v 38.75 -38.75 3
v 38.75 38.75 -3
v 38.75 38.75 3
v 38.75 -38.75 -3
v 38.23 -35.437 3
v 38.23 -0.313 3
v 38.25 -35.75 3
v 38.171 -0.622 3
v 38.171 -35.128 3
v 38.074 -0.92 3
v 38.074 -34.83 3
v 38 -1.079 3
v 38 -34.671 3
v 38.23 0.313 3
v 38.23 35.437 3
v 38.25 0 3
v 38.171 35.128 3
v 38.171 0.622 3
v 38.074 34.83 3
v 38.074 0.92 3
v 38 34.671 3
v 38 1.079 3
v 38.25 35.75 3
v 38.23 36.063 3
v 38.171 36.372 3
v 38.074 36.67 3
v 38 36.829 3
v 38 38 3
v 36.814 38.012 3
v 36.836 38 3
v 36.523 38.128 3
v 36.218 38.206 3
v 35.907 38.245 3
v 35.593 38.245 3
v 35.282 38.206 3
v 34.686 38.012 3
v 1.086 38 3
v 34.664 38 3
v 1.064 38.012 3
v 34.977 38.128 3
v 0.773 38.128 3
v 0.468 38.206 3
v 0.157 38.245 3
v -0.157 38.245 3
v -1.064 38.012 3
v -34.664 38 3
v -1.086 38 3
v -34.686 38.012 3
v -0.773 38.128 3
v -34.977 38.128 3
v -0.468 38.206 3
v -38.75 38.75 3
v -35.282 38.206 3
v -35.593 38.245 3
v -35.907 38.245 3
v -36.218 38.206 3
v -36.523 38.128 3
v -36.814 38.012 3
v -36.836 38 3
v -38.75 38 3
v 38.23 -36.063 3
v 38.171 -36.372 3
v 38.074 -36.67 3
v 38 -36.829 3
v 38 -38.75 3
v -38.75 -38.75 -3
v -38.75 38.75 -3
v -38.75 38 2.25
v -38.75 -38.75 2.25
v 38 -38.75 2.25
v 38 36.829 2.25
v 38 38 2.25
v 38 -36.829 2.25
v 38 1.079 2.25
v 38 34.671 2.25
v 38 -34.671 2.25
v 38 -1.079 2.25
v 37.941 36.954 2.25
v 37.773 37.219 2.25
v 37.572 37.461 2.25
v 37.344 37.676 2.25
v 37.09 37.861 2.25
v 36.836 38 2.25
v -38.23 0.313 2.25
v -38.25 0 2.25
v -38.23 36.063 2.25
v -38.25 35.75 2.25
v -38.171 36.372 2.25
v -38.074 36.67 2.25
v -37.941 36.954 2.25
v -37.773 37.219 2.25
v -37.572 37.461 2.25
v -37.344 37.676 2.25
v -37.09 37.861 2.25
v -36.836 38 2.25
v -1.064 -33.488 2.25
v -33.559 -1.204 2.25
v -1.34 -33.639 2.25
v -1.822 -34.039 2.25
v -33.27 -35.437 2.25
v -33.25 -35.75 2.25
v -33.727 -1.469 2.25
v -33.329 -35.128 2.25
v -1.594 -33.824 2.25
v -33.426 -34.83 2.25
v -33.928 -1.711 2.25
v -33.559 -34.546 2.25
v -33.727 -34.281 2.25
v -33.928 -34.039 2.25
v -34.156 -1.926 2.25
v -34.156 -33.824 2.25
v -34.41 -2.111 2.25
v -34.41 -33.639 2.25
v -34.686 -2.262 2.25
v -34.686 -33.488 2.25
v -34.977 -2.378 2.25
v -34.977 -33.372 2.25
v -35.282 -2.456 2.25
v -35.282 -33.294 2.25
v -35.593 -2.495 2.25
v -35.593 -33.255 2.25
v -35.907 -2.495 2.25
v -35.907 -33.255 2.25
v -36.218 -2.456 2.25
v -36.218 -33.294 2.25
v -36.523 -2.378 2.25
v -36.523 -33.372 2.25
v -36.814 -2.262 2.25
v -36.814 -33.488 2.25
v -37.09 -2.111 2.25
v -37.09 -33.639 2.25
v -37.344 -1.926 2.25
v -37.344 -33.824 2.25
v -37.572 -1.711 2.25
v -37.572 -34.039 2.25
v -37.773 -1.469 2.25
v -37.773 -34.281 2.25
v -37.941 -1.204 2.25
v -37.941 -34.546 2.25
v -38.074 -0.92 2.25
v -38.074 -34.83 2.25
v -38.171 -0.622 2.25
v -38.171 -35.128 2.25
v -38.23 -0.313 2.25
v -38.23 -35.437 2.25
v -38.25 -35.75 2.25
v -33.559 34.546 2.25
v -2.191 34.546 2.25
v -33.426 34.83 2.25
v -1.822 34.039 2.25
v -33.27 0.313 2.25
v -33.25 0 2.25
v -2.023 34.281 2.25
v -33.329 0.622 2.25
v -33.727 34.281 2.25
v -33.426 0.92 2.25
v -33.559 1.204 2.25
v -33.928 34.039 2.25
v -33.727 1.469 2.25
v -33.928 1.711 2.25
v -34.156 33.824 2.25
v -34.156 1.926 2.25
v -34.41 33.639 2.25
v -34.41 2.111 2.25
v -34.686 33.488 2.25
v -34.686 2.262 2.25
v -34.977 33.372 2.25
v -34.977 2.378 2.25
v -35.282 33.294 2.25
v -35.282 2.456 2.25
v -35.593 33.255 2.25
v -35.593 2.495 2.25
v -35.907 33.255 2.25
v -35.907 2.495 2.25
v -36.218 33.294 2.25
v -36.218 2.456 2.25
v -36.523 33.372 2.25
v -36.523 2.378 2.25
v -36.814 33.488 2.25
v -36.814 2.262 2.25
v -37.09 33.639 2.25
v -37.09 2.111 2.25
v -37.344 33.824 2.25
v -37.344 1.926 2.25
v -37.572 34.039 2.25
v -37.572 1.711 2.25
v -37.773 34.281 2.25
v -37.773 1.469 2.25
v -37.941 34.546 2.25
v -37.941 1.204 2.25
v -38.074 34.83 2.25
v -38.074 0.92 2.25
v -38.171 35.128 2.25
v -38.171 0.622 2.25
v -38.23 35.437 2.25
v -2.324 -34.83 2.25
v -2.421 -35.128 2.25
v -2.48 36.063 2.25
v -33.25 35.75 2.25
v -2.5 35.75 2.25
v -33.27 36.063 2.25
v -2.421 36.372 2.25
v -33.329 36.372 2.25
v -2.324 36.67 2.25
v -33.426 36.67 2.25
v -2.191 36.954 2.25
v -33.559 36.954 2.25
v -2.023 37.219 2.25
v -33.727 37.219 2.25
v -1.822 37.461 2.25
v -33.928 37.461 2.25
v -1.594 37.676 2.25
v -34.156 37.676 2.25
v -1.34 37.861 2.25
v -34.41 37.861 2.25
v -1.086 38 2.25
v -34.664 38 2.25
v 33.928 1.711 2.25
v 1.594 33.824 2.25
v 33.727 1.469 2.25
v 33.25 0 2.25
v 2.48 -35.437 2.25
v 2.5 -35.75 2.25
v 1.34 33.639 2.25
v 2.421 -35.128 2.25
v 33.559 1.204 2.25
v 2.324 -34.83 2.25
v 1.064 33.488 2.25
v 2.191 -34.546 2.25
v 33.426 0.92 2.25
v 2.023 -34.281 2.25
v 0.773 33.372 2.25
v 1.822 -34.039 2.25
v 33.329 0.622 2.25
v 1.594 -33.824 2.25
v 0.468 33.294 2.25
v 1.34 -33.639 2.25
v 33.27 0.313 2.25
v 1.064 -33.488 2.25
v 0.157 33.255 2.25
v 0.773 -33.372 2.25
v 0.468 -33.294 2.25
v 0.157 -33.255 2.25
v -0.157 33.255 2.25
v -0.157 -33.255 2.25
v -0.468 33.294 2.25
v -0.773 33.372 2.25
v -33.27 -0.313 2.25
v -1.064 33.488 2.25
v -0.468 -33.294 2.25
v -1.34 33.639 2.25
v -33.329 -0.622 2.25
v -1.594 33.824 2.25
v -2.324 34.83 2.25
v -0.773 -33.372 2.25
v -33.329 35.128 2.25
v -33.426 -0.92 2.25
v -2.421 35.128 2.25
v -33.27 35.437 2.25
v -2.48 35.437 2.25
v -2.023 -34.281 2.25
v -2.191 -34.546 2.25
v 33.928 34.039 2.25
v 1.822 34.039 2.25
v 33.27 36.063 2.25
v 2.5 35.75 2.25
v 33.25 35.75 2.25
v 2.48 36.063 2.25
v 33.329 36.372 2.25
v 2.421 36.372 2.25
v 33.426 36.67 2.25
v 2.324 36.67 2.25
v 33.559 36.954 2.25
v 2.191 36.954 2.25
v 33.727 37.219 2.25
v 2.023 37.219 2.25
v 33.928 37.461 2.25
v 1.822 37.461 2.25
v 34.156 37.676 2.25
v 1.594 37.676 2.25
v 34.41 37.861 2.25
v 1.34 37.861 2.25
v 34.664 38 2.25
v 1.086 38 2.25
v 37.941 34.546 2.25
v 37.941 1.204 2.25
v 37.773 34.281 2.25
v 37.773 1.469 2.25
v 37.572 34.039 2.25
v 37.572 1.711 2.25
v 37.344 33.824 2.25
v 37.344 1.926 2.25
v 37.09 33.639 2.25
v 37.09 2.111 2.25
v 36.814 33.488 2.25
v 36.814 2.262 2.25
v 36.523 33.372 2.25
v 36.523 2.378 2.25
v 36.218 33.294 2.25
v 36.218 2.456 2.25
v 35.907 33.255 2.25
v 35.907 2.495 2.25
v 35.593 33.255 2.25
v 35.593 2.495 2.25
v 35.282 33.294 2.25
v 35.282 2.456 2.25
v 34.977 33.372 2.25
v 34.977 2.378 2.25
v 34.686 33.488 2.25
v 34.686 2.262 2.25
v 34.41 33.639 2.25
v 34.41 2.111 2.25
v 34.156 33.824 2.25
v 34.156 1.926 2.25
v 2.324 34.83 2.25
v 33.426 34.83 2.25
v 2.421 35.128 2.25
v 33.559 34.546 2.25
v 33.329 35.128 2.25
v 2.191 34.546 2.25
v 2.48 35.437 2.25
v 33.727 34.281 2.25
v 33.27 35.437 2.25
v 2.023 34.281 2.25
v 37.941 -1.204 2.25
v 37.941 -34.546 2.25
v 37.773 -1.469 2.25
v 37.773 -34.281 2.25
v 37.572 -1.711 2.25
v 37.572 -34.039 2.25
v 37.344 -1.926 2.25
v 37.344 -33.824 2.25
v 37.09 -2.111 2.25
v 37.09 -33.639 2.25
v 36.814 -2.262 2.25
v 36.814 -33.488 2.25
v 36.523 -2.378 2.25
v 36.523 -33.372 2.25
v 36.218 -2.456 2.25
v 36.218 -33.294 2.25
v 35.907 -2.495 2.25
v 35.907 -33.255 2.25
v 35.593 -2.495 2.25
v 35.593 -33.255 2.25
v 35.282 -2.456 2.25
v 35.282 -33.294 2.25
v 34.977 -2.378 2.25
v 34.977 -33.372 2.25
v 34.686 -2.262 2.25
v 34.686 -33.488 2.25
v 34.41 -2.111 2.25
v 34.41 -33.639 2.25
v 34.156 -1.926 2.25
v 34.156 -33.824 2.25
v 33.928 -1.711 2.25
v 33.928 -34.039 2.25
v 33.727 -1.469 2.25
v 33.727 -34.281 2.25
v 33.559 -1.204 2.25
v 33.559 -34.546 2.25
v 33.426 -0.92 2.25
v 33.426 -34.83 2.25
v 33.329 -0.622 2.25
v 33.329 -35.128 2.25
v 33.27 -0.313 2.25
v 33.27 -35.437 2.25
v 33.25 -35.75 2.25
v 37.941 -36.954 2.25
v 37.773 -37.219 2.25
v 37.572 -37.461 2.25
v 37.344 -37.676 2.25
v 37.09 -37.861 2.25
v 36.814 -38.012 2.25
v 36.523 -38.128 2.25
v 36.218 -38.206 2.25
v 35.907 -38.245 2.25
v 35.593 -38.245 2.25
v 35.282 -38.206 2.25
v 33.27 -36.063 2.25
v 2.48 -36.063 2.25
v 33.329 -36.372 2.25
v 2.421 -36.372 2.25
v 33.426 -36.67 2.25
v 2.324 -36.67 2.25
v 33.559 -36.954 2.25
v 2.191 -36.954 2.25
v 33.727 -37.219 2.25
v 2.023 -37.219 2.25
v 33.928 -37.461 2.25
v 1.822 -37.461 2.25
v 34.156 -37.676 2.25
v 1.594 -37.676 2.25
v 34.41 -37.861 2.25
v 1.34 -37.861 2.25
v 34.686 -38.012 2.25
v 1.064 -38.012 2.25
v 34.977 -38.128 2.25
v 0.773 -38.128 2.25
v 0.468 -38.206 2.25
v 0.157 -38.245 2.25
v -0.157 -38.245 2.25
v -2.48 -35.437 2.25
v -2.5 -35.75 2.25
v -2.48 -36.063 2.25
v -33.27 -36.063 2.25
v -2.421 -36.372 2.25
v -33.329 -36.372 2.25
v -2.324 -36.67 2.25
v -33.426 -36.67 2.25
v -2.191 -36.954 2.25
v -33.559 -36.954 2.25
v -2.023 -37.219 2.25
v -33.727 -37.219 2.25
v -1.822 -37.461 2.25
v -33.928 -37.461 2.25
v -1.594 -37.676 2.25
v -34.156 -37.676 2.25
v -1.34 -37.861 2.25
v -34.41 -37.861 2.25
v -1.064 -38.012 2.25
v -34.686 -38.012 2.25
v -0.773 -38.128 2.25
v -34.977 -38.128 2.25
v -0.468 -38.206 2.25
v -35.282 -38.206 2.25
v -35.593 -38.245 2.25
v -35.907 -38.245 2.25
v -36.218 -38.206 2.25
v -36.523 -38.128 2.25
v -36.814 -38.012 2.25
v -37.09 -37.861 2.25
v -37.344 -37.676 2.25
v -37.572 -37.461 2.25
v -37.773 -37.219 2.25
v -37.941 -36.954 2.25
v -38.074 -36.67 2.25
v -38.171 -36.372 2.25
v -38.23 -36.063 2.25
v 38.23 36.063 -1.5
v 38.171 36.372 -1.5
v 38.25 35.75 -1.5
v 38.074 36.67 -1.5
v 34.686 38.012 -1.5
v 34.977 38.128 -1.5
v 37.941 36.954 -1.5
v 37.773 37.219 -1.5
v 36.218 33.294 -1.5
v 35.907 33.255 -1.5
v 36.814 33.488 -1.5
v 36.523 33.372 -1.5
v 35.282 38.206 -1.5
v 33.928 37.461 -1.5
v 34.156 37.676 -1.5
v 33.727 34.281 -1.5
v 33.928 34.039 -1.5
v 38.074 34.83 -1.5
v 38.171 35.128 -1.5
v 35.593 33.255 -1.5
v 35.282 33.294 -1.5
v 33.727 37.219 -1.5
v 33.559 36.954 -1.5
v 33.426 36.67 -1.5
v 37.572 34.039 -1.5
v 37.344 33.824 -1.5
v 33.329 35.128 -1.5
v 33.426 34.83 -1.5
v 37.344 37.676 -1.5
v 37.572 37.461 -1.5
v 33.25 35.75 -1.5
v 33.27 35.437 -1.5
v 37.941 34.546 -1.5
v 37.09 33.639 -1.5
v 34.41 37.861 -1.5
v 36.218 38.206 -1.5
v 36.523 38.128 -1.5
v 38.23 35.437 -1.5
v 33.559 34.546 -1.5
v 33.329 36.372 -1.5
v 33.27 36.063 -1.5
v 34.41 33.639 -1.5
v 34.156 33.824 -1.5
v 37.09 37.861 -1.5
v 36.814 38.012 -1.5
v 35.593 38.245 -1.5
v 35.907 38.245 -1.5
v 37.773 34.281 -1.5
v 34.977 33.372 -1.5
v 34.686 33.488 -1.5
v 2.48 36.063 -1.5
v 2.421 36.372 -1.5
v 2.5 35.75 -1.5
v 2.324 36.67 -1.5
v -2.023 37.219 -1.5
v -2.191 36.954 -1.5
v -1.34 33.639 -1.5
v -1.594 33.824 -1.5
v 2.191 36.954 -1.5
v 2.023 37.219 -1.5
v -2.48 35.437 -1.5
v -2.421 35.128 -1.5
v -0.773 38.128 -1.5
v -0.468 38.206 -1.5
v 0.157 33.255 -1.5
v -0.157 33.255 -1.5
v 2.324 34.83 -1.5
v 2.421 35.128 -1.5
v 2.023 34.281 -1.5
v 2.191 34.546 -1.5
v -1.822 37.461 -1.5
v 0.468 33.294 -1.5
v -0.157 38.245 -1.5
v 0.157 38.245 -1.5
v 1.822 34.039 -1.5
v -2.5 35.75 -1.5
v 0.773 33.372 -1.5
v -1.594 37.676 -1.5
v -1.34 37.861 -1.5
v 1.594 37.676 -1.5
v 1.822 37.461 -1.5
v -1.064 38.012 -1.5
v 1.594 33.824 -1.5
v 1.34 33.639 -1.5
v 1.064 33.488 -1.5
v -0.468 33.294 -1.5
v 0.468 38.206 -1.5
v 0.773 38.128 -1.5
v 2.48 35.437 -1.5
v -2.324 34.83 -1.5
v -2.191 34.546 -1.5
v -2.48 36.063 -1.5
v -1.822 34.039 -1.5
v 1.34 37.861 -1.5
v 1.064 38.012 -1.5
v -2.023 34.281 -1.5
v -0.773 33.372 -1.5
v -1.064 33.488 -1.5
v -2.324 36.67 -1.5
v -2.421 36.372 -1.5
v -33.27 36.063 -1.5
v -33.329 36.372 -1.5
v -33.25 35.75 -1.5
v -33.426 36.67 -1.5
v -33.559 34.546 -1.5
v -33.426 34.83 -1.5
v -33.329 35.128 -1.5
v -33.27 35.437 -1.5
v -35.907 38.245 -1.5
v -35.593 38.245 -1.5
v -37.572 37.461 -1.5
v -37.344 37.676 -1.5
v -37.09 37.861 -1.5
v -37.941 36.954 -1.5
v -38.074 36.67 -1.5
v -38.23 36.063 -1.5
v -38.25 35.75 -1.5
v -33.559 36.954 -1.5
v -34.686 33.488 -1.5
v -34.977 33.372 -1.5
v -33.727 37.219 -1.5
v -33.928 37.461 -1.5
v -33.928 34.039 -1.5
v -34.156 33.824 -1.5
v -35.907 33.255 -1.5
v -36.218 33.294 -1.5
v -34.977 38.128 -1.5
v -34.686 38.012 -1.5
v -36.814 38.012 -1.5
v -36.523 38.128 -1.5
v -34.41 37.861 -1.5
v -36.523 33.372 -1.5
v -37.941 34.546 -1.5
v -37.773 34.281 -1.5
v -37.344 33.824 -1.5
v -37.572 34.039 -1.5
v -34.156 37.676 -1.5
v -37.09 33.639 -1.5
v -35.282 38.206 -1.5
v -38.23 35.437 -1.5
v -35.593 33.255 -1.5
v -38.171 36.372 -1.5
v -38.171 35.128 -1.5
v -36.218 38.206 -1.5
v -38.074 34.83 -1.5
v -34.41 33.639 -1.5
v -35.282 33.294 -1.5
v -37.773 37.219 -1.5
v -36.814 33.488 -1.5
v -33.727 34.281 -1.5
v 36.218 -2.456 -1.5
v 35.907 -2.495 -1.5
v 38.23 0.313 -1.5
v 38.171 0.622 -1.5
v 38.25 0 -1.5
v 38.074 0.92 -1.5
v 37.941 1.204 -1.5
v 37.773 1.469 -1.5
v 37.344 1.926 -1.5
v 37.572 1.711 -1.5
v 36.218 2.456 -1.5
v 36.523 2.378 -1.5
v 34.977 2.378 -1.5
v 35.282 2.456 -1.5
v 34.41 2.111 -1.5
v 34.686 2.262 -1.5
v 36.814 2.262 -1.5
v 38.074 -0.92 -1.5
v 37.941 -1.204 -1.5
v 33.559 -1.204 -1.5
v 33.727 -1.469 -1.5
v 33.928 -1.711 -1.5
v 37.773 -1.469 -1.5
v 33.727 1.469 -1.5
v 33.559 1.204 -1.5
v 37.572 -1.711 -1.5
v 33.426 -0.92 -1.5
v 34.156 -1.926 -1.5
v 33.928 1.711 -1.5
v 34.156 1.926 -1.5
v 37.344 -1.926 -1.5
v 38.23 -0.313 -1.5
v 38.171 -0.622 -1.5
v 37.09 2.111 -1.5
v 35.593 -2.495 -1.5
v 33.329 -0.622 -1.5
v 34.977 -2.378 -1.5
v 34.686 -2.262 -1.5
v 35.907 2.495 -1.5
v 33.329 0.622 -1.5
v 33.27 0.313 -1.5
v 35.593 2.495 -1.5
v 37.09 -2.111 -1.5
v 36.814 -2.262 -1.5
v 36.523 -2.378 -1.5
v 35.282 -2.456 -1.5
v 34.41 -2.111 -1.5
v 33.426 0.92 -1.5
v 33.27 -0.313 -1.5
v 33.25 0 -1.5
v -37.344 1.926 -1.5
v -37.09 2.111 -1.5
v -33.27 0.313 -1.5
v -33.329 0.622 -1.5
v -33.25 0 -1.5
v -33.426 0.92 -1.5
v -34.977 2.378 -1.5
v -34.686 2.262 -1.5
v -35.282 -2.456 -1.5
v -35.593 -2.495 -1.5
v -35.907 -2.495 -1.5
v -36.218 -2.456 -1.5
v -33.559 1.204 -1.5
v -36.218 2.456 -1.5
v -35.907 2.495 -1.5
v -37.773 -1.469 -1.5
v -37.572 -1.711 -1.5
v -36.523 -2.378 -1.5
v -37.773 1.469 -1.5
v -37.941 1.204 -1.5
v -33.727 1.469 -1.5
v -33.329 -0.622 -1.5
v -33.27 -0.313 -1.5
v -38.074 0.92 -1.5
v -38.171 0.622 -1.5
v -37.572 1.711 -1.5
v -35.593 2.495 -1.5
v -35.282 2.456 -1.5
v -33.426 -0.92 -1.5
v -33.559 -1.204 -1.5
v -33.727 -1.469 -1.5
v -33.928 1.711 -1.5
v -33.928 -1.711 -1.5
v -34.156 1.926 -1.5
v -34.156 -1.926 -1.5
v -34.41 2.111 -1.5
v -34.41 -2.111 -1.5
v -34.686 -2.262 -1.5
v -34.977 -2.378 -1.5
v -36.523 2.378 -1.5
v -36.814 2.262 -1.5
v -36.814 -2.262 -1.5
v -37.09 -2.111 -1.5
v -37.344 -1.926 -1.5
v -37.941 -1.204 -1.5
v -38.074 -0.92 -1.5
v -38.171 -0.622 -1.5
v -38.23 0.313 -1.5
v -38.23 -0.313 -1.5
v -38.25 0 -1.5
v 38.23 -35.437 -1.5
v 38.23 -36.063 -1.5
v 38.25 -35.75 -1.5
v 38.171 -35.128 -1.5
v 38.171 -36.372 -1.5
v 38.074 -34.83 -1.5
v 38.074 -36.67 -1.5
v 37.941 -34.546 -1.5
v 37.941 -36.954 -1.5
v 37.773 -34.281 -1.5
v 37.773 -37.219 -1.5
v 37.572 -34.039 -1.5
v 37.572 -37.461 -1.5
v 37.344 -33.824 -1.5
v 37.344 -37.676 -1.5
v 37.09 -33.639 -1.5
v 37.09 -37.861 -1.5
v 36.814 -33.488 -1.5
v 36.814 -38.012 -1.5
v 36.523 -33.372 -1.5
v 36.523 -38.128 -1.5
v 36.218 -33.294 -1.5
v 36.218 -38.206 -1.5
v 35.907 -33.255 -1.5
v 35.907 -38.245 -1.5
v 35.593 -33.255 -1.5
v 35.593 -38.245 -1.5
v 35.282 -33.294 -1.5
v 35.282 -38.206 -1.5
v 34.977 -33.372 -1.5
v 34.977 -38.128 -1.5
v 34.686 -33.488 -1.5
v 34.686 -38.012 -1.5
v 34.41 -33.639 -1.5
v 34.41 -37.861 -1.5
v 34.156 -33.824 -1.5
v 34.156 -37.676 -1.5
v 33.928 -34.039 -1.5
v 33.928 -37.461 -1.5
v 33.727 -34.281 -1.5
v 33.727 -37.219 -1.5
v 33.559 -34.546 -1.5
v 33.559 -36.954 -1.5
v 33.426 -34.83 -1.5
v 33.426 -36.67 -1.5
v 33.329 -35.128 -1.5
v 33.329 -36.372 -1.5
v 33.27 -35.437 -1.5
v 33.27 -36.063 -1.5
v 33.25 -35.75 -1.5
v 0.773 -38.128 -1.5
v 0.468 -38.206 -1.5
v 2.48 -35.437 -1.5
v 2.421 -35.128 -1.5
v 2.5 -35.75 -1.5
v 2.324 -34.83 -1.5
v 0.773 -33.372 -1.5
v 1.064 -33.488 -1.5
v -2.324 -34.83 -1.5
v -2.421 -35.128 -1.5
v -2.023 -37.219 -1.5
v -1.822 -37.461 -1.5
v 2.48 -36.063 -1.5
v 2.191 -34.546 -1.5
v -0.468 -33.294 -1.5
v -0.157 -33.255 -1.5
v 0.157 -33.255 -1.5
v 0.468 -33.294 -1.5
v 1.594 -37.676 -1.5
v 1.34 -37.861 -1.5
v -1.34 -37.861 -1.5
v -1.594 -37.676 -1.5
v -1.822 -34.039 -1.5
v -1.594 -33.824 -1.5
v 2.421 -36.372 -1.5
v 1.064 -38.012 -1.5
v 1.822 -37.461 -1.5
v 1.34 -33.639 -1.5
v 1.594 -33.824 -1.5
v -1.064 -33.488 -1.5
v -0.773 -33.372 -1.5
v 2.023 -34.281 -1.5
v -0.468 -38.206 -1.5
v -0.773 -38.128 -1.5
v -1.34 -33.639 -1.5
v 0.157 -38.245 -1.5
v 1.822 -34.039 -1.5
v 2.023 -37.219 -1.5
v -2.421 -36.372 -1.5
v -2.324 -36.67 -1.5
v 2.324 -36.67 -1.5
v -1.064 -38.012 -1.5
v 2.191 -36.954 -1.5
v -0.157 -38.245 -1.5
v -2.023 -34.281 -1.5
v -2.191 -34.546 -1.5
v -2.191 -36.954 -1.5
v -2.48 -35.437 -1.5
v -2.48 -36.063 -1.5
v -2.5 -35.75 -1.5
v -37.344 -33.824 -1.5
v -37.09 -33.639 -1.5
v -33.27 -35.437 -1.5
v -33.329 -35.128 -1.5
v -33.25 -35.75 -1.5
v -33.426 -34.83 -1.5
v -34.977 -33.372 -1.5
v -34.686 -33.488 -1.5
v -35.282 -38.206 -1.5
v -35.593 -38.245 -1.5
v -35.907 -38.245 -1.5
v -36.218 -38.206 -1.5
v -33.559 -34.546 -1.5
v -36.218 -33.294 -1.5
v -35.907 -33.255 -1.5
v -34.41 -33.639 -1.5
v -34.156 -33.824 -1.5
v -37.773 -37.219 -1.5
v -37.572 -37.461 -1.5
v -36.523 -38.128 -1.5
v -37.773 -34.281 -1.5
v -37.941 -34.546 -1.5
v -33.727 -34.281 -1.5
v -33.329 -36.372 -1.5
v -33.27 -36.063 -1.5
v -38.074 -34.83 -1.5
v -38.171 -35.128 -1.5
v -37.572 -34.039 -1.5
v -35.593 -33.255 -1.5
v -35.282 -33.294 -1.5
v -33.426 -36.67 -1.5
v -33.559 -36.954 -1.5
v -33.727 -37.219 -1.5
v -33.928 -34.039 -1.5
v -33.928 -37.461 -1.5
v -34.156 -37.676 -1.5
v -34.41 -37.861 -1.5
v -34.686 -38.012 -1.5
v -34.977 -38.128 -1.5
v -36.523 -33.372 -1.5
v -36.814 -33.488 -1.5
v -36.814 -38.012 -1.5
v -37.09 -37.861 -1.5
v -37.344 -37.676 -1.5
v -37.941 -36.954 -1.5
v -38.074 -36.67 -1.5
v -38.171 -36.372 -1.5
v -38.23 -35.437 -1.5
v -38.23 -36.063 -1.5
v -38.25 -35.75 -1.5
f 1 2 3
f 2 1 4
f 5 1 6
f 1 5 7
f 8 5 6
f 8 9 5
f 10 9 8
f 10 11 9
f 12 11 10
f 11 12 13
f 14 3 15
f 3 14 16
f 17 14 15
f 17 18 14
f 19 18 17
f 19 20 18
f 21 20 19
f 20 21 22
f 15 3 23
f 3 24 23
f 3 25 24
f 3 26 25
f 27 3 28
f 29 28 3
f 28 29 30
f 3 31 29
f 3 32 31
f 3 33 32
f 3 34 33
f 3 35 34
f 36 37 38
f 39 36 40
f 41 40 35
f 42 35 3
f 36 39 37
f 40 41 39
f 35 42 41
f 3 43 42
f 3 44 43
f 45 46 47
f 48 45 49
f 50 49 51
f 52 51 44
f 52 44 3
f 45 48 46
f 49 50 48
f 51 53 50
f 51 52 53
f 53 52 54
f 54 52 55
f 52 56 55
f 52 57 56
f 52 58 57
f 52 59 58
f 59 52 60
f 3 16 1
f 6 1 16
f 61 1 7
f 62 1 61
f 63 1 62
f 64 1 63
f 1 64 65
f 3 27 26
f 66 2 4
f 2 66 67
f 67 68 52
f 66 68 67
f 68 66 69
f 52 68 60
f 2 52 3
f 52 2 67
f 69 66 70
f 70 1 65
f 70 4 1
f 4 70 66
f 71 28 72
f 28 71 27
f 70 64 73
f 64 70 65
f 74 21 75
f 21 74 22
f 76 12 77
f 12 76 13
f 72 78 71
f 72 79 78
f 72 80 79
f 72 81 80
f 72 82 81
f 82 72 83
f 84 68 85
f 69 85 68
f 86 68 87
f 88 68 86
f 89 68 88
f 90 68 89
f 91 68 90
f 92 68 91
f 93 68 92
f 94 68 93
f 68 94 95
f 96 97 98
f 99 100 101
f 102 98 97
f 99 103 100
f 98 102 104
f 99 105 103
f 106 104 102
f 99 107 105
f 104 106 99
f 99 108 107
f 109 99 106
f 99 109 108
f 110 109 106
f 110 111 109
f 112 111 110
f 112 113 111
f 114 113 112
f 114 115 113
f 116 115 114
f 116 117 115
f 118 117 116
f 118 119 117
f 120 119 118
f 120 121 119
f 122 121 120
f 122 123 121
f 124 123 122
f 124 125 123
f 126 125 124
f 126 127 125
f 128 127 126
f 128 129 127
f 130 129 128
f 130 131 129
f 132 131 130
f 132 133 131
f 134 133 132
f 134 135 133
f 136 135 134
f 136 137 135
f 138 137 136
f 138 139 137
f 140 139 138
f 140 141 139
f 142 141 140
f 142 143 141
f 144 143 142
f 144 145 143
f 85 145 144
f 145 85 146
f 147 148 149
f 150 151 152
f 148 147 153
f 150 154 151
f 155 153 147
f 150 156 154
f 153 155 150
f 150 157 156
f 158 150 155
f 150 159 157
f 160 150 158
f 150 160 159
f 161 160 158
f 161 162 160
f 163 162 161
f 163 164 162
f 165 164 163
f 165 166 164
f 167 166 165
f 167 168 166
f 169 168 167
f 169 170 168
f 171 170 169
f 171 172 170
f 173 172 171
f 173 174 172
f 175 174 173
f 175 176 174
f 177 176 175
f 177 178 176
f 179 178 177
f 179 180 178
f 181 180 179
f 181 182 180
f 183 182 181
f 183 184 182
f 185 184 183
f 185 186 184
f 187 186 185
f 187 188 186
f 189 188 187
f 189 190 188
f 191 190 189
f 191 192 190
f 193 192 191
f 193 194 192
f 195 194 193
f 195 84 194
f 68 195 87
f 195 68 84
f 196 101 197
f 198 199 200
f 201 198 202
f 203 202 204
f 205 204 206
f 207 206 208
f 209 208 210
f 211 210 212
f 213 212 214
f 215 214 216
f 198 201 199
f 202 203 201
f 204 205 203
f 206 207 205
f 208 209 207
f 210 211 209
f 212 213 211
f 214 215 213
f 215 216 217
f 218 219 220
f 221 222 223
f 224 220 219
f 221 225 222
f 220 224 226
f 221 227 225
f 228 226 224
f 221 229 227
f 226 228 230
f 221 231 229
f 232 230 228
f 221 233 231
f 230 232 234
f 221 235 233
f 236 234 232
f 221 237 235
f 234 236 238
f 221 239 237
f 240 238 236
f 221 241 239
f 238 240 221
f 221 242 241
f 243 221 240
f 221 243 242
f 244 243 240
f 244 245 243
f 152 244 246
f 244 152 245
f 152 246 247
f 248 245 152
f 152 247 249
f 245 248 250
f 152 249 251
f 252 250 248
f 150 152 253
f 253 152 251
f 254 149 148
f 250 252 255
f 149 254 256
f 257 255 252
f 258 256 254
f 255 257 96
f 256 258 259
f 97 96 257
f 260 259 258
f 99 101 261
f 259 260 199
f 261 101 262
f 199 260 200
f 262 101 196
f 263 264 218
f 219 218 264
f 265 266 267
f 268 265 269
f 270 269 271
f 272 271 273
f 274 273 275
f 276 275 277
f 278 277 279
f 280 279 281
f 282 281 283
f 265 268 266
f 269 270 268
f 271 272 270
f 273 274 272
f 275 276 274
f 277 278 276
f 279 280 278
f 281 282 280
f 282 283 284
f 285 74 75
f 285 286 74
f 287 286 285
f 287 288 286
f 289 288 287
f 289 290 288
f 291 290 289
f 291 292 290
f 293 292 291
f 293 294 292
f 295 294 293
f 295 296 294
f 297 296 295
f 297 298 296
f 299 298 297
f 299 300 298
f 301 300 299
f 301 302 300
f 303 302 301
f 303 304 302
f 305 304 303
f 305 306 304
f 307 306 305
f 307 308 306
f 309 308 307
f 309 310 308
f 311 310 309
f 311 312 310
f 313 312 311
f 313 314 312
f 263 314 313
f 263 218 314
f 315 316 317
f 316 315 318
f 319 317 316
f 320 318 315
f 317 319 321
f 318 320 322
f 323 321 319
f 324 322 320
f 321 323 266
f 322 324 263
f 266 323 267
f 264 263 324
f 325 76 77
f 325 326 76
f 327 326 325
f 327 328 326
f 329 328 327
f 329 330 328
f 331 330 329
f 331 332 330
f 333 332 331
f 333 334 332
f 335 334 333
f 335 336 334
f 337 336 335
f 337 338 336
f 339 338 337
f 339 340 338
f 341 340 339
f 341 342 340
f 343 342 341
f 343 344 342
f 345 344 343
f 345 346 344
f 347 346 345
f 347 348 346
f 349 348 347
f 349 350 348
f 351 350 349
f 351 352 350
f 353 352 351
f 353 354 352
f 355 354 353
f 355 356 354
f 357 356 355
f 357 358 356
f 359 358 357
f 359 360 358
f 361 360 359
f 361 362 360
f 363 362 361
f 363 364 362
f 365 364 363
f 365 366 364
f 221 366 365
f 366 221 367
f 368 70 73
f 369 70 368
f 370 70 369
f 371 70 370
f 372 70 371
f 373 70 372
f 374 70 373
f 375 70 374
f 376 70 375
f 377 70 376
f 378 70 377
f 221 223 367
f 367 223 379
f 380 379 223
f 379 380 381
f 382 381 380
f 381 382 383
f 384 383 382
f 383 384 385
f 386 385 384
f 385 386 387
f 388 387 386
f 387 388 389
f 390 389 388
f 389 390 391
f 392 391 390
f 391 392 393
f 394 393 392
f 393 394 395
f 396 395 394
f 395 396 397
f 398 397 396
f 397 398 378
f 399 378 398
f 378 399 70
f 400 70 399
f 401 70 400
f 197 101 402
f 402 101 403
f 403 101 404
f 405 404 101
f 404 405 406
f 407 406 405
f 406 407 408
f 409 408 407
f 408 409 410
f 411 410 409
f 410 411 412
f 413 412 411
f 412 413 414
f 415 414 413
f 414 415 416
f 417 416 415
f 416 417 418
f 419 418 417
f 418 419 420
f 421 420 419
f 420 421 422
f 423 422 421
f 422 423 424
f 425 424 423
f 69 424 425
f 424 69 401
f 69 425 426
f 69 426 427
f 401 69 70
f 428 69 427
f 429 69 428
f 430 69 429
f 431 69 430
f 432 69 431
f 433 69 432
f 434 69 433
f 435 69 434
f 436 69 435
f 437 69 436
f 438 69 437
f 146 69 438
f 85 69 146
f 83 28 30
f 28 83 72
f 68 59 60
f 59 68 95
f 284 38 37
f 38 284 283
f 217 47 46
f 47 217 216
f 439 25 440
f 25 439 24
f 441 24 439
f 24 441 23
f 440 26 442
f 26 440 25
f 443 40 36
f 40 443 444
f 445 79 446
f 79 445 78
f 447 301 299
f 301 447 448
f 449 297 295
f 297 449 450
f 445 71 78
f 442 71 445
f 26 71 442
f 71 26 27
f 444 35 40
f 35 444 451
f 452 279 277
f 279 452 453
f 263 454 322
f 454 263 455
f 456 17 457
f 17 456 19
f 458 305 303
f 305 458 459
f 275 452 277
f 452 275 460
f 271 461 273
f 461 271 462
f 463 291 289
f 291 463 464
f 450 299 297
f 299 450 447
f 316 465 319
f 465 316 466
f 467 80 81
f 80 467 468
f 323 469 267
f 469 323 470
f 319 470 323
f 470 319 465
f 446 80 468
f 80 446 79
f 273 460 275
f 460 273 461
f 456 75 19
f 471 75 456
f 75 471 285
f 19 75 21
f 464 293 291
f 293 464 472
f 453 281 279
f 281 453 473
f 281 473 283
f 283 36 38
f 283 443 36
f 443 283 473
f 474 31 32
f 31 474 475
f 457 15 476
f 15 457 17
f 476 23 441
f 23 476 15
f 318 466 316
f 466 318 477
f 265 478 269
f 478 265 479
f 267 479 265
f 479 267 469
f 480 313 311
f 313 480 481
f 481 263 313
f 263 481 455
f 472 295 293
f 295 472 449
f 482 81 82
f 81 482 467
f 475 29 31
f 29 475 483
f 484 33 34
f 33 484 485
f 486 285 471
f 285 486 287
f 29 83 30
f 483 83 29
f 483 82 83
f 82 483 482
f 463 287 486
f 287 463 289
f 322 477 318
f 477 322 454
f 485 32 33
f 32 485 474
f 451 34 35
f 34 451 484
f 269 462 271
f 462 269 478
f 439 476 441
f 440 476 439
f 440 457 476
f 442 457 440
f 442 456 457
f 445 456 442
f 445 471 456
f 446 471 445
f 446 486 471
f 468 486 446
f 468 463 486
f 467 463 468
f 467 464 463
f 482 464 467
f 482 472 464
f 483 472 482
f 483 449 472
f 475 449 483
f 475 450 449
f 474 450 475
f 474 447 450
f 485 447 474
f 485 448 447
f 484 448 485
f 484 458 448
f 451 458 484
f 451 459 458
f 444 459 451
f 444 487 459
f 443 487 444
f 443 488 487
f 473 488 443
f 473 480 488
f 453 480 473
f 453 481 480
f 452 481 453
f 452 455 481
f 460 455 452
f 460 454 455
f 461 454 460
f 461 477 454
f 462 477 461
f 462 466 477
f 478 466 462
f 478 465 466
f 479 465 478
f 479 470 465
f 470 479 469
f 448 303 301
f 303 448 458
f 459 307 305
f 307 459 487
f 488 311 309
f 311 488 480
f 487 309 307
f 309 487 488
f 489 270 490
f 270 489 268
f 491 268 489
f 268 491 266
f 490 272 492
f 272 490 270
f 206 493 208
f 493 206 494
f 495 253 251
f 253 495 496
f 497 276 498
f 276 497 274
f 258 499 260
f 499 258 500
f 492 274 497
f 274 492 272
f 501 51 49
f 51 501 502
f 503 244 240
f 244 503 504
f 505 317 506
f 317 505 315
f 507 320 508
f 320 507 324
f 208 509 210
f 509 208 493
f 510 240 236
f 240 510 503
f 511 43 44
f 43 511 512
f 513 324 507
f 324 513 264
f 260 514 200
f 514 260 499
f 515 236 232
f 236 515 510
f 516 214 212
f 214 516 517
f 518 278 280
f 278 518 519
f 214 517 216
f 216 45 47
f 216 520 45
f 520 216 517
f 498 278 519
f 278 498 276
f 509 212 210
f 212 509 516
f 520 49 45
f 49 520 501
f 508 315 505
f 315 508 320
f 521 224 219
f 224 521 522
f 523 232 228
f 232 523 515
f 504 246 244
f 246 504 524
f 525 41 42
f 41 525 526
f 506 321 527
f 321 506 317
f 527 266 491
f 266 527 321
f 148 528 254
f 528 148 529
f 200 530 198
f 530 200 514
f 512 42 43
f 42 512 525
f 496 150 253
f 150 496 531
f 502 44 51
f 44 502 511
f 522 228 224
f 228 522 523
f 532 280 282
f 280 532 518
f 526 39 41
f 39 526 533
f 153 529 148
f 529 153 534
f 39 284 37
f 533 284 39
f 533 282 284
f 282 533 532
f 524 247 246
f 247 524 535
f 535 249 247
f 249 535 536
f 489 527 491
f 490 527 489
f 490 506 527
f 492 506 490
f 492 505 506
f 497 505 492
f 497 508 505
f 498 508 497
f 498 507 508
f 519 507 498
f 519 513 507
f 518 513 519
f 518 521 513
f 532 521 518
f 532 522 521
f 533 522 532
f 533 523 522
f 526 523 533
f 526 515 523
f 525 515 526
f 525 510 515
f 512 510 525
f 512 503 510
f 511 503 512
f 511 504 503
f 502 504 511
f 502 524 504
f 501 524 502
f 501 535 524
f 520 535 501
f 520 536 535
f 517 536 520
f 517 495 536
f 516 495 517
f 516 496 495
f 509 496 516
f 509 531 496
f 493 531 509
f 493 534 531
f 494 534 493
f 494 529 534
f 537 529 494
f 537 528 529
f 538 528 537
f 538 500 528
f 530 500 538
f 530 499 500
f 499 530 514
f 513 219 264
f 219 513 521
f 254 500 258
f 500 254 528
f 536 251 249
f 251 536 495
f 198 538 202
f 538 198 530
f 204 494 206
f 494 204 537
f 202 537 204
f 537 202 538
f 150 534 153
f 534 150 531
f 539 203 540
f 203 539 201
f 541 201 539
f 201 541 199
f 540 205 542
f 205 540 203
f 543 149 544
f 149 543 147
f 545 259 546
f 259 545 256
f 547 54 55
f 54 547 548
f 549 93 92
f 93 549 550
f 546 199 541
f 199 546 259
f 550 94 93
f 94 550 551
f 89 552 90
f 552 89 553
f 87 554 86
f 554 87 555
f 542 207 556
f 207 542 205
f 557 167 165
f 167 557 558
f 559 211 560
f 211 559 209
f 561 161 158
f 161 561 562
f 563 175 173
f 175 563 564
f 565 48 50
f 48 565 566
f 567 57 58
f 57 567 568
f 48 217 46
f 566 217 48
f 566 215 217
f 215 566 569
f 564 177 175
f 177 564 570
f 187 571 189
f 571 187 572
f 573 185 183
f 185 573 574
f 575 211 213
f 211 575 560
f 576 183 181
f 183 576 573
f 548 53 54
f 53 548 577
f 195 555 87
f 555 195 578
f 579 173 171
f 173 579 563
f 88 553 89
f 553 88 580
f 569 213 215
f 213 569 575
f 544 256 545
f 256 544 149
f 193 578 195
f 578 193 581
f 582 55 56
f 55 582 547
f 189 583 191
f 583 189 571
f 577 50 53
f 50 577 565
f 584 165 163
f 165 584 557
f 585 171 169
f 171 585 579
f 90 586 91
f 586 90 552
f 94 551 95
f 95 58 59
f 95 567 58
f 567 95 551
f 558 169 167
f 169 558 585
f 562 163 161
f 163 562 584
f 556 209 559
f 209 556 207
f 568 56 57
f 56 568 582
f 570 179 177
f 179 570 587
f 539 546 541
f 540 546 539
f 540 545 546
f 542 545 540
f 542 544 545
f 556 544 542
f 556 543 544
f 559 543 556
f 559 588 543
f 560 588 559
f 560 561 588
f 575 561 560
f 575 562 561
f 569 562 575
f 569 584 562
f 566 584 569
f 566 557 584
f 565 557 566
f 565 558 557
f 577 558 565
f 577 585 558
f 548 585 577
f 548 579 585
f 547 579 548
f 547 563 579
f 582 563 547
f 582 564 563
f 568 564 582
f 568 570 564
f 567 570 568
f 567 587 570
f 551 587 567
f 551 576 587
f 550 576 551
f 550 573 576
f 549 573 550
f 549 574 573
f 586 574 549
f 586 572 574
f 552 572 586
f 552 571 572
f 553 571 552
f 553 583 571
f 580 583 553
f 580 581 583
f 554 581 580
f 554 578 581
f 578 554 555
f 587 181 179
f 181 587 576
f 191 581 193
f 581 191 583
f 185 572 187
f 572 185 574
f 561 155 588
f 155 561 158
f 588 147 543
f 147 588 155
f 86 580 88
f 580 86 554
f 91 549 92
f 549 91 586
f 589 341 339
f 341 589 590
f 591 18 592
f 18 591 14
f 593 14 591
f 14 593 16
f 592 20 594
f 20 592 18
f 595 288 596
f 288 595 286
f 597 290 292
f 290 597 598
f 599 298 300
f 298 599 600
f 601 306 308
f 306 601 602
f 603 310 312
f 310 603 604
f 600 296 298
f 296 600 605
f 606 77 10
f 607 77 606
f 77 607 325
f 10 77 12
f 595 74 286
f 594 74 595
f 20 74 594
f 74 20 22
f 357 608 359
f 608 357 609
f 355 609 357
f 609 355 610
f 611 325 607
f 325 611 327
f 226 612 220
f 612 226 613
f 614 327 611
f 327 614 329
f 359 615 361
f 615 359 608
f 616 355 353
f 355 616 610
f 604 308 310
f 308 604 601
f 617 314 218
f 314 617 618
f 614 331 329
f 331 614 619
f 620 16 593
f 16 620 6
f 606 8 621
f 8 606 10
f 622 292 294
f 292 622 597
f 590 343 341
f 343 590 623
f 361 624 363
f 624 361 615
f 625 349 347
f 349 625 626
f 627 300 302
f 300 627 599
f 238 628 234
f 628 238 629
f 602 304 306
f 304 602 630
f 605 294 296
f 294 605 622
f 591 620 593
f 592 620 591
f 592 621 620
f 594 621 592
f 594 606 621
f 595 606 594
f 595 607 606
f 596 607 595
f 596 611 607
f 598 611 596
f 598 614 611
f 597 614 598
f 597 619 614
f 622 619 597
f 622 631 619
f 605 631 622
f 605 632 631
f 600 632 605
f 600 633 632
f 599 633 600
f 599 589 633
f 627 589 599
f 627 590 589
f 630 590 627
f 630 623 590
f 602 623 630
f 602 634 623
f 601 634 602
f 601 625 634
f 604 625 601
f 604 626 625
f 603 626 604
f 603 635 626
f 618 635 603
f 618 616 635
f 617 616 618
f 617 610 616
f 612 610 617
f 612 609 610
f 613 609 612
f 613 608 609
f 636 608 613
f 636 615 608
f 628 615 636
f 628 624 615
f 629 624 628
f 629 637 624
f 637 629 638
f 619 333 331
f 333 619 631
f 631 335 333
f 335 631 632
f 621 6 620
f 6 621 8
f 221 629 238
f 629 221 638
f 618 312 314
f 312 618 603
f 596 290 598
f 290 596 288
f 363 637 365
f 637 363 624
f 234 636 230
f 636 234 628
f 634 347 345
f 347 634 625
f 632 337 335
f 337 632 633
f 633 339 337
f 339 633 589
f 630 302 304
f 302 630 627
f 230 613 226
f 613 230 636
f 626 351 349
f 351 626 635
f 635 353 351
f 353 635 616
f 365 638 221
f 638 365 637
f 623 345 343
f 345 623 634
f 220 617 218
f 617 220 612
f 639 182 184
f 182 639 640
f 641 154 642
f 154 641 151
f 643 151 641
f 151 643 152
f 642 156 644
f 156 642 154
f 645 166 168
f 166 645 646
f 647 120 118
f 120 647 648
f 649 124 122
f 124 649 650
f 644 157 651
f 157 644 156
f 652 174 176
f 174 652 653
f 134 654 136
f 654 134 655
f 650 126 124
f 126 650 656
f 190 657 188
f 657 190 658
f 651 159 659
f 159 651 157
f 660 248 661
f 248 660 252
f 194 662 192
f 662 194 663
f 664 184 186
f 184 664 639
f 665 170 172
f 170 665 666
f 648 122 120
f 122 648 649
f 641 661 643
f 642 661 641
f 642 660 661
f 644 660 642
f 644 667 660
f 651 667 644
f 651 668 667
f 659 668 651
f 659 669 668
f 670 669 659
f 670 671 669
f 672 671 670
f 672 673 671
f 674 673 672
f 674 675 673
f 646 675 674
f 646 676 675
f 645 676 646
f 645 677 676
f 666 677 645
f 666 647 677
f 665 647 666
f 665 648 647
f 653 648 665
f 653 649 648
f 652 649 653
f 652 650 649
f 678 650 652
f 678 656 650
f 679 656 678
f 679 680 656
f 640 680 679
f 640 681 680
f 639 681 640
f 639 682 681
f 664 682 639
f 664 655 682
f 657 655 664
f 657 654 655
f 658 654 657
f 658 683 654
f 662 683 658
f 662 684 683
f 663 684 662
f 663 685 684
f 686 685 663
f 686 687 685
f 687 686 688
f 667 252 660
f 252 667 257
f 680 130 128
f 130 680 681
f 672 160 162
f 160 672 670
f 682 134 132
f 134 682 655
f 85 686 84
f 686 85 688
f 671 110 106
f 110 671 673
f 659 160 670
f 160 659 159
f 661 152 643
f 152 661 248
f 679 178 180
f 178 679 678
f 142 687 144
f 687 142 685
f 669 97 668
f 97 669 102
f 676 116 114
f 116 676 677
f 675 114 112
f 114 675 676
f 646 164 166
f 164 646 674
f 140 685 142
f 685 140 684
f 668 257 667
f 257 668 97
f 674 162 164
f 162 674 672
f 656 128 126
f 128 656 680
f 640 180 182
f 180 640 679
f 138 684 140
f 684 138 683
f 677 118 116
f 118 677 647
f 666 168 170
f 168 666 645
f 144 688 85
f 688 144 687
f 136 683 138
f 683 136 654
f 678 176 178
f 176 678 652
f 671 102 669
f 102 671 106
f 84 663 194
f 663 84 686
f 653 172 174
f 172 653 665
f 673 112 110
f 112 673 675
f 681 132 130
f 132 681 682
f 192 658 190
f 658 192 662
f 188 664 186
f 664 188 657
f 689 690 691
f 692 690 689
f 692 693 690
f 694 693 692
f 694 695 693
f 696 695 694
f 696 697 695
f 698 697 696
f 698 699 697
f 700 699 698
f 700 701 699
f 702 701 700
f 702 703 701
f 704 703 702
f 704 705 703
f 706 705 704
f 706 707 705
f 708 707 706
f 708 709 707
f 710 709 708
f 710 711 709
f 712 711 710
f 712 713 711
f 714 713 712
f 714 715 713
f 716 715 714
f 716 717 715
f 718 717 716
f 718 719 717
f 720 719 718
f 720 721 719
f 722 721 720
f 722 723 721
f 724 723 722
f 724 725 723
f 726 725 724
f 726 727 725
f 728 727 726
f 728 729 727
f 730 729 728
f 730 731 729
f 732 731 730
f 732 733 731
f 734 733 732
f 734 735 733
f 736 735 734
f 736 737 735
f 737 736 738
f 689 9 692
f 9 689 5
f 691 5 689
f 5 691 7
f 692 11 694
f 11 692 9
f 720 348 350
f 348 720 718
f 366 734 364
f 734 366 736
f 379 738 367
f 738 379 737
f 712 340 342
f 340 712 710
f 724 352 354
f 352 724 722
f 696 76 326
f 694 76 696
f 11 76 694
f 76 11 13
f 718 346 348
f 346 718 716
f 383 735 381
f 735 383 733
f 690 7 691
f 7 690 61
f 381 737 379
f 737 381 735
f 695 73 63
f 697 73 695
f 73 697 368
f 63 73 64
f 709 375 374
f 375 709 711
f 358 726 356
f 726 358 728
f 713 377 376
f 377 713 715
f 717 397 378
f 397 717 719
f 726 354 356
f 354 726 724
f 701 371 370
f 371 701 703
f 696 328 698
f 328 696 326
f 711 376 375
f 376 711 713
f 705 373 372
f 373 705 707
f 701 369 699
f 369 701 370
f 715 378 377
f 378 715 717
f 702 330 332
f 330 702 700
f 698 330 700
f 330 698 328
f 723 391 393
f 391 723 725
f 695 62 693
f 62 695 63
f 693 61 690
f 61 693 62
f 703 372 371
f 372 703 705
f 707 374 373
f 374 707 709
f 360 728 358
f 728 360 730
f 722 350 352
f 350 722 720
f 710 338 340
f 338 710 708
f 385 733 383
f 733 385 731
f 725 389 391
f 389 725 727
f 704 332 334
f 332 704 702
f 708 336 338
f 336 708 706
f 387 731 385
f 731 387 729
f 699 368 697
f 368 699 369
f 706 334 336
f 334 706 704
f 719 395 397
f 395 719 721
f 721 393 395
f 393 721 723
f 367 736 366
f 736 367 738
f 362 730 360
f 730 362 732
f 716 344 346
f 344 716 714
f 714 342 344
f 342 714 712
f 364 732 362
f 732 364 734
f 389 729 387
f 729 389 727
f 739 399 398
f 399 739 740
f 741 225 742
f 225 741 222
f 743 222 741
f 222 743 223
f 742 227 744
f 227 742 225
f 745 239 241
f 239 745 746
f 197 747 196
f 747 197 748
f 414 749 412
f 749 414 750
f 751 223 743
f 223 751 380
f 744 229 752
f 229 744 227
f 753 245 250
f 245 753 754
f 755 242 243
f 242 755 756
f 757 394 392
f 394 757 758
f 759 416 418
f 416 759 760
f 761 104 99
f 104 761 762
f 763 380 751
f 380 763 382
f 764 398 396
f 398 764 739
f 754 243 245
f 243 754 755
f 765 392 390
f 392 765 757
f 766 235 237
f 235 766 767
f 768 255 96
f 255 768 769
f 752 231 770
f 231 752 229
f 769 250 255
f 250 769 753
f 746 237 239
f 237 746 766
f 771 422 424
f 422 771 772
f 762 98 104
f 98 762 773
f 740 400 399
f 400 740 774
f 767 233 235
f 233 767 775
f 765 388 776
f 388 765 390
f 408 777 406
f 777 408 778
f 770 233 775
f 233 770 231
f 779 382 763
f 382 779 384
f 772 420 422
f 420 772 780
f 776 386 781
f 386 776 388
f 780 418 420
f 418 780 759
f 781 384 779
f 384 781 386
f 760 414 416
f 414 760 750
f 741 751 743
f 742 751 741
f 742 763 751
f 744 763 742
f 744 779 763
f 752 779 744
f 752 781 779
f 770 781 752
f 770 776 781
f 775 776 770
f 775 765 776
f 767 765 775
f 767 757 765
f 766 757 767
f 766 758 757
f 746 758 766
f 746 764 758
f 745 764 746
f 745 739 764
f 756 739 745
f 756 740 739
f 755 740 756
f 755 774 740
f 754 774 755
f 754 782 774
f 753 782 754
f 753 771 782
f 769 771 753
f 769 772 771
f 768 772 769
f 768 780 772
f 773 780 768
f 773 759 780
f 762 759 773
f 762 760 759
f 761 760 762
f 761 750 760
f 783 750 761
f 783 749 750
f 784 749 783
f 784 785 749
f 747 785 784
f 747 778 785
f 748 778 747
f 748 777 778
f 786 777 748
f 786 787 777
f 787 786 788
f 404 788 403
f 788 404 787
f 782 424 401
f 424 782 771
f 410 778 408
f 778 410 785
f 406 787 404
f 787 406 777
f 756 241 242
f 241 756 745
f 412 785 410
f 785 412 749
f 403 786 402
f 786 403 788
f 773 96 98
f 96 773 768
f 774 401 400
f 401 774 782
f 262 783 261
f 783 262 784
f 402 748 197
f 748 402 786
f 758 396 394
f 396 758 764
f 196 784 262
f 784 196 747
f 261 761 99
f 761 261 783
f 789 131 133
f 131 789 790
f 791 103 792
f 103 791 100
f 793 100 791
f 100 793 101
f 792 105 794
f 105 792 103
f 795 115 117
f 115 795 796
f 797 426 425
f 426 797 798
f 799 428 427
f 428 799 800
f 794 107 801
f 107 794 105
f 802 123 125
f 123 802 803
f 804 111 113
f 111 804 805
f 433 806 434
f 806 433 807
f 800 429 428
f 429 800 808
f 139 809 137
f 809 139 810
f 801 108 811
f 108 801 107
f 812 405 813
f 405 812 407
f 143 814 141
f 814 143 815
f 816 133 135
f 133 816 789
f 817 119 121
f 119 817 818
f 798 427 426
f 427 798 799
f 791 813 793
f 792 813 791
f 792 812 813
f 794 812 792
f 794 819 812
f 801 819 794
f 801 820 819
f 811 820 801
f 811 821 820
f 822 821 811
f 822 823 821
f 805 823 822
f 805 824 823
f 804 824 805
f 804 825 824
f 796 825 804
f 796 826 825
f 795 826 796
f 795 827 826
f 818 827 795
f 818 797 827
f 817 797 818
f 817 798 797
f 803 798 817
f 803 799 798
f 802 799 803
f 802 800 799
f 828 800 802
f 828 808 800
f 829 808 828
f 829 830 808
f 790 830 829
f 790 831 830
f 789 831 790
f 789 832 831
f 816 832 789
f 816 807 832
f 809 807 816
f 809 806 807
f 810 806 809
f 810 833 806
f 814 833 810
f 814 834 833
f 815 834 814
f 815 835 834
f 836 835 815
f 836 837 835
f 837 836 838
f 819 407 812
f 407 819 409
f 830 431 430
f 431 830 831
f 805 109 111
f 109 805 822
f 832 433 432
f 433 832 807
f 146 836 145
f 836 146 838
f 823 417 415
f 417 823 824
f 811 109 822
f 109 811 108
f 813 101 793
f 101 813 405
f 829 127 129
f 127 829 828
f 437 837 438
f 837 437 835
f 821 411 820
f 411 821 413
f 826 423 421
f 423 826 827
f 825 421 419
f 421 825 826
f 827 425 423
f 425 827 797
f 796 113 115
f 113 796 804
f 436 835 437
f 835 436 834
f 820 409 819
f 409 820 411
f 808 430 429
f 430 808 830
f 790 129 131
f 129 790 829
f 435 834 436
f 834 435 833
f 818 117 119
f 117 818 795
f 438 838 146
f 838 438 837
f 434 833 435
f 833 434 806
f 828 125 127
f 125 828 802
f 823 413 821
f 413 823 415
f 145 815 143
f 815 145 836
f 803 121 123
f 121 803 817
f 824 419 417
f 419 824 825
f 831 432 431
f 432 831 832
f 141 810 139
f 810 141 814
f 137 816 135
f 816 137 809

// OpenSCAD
inset_x = 78;
inset_y = 78;
inset_z = 2.5;

outer_x = 77.5;
outer_y = 77.5;
outer_z = 6;

hole_r = 2.5;
hole_z = 5;
$fn=50;

edge_inset = 6;

hole_x = ((outer_x - edge_inset) / 2);
neg_hole_x = (((outer_x - edge_inset) / 2) * -1);
hole_y = ((outer_y - edge_inset) / 2);
neg_hole_y = (((outer_y - edge_inset) / 2) * -1);

difference() {
    cube([outer_x, outer_y, outer_z], center = true);
    translate([-1, -1, 3.5])
    {
        cube([inset_x, inset_y, inset_z], center = true);
    }
    
    /* Top right */
    translate([hole_x, hole_y, -1.5])
    {
        cylinder(hole_z, hole_r, hole_r, false);
    }
    
    /* Top Mid */
    translate([0, hole_y, -1.5])
    {
        cylinder(outer_x, hole_r, hole_r, false);
    }

    /* Top Left */
    translate([neg_hole_x, hole_y, -1.5])
    {
        cylinder(hole_z, hole_r, hole_r, false);
    }

    /* Mid Right */
    translate([hole_x, 0, -1.5])
    {
        cylinder(hole_z, hole_r, hole_r, false);
    }   
    
    /* Mid Left */
    translate([neg_hole_x, 0, -1.5])
    {
        cylinder(hole_z, hole_r, hole_r, false);
    }
    
    /* Bottom Right */
    translate([hole_x, neg_hole_y, -1.5])
    {
        cylinder(hole_z, hole_r, hole_r, false);
    }
    
    /* Bottom Mid */
    translate([0, neg_hole_y, -1.5])
    {
        cylinder(outer_x, hole_r, hole_r, false);
    }

    /* Bottom Left */
    translate([neg_hole_x, neg_hole_y, -1.5])
    {
        cylinder(hole_z, hole_r, hole_r, false);
    }
}
